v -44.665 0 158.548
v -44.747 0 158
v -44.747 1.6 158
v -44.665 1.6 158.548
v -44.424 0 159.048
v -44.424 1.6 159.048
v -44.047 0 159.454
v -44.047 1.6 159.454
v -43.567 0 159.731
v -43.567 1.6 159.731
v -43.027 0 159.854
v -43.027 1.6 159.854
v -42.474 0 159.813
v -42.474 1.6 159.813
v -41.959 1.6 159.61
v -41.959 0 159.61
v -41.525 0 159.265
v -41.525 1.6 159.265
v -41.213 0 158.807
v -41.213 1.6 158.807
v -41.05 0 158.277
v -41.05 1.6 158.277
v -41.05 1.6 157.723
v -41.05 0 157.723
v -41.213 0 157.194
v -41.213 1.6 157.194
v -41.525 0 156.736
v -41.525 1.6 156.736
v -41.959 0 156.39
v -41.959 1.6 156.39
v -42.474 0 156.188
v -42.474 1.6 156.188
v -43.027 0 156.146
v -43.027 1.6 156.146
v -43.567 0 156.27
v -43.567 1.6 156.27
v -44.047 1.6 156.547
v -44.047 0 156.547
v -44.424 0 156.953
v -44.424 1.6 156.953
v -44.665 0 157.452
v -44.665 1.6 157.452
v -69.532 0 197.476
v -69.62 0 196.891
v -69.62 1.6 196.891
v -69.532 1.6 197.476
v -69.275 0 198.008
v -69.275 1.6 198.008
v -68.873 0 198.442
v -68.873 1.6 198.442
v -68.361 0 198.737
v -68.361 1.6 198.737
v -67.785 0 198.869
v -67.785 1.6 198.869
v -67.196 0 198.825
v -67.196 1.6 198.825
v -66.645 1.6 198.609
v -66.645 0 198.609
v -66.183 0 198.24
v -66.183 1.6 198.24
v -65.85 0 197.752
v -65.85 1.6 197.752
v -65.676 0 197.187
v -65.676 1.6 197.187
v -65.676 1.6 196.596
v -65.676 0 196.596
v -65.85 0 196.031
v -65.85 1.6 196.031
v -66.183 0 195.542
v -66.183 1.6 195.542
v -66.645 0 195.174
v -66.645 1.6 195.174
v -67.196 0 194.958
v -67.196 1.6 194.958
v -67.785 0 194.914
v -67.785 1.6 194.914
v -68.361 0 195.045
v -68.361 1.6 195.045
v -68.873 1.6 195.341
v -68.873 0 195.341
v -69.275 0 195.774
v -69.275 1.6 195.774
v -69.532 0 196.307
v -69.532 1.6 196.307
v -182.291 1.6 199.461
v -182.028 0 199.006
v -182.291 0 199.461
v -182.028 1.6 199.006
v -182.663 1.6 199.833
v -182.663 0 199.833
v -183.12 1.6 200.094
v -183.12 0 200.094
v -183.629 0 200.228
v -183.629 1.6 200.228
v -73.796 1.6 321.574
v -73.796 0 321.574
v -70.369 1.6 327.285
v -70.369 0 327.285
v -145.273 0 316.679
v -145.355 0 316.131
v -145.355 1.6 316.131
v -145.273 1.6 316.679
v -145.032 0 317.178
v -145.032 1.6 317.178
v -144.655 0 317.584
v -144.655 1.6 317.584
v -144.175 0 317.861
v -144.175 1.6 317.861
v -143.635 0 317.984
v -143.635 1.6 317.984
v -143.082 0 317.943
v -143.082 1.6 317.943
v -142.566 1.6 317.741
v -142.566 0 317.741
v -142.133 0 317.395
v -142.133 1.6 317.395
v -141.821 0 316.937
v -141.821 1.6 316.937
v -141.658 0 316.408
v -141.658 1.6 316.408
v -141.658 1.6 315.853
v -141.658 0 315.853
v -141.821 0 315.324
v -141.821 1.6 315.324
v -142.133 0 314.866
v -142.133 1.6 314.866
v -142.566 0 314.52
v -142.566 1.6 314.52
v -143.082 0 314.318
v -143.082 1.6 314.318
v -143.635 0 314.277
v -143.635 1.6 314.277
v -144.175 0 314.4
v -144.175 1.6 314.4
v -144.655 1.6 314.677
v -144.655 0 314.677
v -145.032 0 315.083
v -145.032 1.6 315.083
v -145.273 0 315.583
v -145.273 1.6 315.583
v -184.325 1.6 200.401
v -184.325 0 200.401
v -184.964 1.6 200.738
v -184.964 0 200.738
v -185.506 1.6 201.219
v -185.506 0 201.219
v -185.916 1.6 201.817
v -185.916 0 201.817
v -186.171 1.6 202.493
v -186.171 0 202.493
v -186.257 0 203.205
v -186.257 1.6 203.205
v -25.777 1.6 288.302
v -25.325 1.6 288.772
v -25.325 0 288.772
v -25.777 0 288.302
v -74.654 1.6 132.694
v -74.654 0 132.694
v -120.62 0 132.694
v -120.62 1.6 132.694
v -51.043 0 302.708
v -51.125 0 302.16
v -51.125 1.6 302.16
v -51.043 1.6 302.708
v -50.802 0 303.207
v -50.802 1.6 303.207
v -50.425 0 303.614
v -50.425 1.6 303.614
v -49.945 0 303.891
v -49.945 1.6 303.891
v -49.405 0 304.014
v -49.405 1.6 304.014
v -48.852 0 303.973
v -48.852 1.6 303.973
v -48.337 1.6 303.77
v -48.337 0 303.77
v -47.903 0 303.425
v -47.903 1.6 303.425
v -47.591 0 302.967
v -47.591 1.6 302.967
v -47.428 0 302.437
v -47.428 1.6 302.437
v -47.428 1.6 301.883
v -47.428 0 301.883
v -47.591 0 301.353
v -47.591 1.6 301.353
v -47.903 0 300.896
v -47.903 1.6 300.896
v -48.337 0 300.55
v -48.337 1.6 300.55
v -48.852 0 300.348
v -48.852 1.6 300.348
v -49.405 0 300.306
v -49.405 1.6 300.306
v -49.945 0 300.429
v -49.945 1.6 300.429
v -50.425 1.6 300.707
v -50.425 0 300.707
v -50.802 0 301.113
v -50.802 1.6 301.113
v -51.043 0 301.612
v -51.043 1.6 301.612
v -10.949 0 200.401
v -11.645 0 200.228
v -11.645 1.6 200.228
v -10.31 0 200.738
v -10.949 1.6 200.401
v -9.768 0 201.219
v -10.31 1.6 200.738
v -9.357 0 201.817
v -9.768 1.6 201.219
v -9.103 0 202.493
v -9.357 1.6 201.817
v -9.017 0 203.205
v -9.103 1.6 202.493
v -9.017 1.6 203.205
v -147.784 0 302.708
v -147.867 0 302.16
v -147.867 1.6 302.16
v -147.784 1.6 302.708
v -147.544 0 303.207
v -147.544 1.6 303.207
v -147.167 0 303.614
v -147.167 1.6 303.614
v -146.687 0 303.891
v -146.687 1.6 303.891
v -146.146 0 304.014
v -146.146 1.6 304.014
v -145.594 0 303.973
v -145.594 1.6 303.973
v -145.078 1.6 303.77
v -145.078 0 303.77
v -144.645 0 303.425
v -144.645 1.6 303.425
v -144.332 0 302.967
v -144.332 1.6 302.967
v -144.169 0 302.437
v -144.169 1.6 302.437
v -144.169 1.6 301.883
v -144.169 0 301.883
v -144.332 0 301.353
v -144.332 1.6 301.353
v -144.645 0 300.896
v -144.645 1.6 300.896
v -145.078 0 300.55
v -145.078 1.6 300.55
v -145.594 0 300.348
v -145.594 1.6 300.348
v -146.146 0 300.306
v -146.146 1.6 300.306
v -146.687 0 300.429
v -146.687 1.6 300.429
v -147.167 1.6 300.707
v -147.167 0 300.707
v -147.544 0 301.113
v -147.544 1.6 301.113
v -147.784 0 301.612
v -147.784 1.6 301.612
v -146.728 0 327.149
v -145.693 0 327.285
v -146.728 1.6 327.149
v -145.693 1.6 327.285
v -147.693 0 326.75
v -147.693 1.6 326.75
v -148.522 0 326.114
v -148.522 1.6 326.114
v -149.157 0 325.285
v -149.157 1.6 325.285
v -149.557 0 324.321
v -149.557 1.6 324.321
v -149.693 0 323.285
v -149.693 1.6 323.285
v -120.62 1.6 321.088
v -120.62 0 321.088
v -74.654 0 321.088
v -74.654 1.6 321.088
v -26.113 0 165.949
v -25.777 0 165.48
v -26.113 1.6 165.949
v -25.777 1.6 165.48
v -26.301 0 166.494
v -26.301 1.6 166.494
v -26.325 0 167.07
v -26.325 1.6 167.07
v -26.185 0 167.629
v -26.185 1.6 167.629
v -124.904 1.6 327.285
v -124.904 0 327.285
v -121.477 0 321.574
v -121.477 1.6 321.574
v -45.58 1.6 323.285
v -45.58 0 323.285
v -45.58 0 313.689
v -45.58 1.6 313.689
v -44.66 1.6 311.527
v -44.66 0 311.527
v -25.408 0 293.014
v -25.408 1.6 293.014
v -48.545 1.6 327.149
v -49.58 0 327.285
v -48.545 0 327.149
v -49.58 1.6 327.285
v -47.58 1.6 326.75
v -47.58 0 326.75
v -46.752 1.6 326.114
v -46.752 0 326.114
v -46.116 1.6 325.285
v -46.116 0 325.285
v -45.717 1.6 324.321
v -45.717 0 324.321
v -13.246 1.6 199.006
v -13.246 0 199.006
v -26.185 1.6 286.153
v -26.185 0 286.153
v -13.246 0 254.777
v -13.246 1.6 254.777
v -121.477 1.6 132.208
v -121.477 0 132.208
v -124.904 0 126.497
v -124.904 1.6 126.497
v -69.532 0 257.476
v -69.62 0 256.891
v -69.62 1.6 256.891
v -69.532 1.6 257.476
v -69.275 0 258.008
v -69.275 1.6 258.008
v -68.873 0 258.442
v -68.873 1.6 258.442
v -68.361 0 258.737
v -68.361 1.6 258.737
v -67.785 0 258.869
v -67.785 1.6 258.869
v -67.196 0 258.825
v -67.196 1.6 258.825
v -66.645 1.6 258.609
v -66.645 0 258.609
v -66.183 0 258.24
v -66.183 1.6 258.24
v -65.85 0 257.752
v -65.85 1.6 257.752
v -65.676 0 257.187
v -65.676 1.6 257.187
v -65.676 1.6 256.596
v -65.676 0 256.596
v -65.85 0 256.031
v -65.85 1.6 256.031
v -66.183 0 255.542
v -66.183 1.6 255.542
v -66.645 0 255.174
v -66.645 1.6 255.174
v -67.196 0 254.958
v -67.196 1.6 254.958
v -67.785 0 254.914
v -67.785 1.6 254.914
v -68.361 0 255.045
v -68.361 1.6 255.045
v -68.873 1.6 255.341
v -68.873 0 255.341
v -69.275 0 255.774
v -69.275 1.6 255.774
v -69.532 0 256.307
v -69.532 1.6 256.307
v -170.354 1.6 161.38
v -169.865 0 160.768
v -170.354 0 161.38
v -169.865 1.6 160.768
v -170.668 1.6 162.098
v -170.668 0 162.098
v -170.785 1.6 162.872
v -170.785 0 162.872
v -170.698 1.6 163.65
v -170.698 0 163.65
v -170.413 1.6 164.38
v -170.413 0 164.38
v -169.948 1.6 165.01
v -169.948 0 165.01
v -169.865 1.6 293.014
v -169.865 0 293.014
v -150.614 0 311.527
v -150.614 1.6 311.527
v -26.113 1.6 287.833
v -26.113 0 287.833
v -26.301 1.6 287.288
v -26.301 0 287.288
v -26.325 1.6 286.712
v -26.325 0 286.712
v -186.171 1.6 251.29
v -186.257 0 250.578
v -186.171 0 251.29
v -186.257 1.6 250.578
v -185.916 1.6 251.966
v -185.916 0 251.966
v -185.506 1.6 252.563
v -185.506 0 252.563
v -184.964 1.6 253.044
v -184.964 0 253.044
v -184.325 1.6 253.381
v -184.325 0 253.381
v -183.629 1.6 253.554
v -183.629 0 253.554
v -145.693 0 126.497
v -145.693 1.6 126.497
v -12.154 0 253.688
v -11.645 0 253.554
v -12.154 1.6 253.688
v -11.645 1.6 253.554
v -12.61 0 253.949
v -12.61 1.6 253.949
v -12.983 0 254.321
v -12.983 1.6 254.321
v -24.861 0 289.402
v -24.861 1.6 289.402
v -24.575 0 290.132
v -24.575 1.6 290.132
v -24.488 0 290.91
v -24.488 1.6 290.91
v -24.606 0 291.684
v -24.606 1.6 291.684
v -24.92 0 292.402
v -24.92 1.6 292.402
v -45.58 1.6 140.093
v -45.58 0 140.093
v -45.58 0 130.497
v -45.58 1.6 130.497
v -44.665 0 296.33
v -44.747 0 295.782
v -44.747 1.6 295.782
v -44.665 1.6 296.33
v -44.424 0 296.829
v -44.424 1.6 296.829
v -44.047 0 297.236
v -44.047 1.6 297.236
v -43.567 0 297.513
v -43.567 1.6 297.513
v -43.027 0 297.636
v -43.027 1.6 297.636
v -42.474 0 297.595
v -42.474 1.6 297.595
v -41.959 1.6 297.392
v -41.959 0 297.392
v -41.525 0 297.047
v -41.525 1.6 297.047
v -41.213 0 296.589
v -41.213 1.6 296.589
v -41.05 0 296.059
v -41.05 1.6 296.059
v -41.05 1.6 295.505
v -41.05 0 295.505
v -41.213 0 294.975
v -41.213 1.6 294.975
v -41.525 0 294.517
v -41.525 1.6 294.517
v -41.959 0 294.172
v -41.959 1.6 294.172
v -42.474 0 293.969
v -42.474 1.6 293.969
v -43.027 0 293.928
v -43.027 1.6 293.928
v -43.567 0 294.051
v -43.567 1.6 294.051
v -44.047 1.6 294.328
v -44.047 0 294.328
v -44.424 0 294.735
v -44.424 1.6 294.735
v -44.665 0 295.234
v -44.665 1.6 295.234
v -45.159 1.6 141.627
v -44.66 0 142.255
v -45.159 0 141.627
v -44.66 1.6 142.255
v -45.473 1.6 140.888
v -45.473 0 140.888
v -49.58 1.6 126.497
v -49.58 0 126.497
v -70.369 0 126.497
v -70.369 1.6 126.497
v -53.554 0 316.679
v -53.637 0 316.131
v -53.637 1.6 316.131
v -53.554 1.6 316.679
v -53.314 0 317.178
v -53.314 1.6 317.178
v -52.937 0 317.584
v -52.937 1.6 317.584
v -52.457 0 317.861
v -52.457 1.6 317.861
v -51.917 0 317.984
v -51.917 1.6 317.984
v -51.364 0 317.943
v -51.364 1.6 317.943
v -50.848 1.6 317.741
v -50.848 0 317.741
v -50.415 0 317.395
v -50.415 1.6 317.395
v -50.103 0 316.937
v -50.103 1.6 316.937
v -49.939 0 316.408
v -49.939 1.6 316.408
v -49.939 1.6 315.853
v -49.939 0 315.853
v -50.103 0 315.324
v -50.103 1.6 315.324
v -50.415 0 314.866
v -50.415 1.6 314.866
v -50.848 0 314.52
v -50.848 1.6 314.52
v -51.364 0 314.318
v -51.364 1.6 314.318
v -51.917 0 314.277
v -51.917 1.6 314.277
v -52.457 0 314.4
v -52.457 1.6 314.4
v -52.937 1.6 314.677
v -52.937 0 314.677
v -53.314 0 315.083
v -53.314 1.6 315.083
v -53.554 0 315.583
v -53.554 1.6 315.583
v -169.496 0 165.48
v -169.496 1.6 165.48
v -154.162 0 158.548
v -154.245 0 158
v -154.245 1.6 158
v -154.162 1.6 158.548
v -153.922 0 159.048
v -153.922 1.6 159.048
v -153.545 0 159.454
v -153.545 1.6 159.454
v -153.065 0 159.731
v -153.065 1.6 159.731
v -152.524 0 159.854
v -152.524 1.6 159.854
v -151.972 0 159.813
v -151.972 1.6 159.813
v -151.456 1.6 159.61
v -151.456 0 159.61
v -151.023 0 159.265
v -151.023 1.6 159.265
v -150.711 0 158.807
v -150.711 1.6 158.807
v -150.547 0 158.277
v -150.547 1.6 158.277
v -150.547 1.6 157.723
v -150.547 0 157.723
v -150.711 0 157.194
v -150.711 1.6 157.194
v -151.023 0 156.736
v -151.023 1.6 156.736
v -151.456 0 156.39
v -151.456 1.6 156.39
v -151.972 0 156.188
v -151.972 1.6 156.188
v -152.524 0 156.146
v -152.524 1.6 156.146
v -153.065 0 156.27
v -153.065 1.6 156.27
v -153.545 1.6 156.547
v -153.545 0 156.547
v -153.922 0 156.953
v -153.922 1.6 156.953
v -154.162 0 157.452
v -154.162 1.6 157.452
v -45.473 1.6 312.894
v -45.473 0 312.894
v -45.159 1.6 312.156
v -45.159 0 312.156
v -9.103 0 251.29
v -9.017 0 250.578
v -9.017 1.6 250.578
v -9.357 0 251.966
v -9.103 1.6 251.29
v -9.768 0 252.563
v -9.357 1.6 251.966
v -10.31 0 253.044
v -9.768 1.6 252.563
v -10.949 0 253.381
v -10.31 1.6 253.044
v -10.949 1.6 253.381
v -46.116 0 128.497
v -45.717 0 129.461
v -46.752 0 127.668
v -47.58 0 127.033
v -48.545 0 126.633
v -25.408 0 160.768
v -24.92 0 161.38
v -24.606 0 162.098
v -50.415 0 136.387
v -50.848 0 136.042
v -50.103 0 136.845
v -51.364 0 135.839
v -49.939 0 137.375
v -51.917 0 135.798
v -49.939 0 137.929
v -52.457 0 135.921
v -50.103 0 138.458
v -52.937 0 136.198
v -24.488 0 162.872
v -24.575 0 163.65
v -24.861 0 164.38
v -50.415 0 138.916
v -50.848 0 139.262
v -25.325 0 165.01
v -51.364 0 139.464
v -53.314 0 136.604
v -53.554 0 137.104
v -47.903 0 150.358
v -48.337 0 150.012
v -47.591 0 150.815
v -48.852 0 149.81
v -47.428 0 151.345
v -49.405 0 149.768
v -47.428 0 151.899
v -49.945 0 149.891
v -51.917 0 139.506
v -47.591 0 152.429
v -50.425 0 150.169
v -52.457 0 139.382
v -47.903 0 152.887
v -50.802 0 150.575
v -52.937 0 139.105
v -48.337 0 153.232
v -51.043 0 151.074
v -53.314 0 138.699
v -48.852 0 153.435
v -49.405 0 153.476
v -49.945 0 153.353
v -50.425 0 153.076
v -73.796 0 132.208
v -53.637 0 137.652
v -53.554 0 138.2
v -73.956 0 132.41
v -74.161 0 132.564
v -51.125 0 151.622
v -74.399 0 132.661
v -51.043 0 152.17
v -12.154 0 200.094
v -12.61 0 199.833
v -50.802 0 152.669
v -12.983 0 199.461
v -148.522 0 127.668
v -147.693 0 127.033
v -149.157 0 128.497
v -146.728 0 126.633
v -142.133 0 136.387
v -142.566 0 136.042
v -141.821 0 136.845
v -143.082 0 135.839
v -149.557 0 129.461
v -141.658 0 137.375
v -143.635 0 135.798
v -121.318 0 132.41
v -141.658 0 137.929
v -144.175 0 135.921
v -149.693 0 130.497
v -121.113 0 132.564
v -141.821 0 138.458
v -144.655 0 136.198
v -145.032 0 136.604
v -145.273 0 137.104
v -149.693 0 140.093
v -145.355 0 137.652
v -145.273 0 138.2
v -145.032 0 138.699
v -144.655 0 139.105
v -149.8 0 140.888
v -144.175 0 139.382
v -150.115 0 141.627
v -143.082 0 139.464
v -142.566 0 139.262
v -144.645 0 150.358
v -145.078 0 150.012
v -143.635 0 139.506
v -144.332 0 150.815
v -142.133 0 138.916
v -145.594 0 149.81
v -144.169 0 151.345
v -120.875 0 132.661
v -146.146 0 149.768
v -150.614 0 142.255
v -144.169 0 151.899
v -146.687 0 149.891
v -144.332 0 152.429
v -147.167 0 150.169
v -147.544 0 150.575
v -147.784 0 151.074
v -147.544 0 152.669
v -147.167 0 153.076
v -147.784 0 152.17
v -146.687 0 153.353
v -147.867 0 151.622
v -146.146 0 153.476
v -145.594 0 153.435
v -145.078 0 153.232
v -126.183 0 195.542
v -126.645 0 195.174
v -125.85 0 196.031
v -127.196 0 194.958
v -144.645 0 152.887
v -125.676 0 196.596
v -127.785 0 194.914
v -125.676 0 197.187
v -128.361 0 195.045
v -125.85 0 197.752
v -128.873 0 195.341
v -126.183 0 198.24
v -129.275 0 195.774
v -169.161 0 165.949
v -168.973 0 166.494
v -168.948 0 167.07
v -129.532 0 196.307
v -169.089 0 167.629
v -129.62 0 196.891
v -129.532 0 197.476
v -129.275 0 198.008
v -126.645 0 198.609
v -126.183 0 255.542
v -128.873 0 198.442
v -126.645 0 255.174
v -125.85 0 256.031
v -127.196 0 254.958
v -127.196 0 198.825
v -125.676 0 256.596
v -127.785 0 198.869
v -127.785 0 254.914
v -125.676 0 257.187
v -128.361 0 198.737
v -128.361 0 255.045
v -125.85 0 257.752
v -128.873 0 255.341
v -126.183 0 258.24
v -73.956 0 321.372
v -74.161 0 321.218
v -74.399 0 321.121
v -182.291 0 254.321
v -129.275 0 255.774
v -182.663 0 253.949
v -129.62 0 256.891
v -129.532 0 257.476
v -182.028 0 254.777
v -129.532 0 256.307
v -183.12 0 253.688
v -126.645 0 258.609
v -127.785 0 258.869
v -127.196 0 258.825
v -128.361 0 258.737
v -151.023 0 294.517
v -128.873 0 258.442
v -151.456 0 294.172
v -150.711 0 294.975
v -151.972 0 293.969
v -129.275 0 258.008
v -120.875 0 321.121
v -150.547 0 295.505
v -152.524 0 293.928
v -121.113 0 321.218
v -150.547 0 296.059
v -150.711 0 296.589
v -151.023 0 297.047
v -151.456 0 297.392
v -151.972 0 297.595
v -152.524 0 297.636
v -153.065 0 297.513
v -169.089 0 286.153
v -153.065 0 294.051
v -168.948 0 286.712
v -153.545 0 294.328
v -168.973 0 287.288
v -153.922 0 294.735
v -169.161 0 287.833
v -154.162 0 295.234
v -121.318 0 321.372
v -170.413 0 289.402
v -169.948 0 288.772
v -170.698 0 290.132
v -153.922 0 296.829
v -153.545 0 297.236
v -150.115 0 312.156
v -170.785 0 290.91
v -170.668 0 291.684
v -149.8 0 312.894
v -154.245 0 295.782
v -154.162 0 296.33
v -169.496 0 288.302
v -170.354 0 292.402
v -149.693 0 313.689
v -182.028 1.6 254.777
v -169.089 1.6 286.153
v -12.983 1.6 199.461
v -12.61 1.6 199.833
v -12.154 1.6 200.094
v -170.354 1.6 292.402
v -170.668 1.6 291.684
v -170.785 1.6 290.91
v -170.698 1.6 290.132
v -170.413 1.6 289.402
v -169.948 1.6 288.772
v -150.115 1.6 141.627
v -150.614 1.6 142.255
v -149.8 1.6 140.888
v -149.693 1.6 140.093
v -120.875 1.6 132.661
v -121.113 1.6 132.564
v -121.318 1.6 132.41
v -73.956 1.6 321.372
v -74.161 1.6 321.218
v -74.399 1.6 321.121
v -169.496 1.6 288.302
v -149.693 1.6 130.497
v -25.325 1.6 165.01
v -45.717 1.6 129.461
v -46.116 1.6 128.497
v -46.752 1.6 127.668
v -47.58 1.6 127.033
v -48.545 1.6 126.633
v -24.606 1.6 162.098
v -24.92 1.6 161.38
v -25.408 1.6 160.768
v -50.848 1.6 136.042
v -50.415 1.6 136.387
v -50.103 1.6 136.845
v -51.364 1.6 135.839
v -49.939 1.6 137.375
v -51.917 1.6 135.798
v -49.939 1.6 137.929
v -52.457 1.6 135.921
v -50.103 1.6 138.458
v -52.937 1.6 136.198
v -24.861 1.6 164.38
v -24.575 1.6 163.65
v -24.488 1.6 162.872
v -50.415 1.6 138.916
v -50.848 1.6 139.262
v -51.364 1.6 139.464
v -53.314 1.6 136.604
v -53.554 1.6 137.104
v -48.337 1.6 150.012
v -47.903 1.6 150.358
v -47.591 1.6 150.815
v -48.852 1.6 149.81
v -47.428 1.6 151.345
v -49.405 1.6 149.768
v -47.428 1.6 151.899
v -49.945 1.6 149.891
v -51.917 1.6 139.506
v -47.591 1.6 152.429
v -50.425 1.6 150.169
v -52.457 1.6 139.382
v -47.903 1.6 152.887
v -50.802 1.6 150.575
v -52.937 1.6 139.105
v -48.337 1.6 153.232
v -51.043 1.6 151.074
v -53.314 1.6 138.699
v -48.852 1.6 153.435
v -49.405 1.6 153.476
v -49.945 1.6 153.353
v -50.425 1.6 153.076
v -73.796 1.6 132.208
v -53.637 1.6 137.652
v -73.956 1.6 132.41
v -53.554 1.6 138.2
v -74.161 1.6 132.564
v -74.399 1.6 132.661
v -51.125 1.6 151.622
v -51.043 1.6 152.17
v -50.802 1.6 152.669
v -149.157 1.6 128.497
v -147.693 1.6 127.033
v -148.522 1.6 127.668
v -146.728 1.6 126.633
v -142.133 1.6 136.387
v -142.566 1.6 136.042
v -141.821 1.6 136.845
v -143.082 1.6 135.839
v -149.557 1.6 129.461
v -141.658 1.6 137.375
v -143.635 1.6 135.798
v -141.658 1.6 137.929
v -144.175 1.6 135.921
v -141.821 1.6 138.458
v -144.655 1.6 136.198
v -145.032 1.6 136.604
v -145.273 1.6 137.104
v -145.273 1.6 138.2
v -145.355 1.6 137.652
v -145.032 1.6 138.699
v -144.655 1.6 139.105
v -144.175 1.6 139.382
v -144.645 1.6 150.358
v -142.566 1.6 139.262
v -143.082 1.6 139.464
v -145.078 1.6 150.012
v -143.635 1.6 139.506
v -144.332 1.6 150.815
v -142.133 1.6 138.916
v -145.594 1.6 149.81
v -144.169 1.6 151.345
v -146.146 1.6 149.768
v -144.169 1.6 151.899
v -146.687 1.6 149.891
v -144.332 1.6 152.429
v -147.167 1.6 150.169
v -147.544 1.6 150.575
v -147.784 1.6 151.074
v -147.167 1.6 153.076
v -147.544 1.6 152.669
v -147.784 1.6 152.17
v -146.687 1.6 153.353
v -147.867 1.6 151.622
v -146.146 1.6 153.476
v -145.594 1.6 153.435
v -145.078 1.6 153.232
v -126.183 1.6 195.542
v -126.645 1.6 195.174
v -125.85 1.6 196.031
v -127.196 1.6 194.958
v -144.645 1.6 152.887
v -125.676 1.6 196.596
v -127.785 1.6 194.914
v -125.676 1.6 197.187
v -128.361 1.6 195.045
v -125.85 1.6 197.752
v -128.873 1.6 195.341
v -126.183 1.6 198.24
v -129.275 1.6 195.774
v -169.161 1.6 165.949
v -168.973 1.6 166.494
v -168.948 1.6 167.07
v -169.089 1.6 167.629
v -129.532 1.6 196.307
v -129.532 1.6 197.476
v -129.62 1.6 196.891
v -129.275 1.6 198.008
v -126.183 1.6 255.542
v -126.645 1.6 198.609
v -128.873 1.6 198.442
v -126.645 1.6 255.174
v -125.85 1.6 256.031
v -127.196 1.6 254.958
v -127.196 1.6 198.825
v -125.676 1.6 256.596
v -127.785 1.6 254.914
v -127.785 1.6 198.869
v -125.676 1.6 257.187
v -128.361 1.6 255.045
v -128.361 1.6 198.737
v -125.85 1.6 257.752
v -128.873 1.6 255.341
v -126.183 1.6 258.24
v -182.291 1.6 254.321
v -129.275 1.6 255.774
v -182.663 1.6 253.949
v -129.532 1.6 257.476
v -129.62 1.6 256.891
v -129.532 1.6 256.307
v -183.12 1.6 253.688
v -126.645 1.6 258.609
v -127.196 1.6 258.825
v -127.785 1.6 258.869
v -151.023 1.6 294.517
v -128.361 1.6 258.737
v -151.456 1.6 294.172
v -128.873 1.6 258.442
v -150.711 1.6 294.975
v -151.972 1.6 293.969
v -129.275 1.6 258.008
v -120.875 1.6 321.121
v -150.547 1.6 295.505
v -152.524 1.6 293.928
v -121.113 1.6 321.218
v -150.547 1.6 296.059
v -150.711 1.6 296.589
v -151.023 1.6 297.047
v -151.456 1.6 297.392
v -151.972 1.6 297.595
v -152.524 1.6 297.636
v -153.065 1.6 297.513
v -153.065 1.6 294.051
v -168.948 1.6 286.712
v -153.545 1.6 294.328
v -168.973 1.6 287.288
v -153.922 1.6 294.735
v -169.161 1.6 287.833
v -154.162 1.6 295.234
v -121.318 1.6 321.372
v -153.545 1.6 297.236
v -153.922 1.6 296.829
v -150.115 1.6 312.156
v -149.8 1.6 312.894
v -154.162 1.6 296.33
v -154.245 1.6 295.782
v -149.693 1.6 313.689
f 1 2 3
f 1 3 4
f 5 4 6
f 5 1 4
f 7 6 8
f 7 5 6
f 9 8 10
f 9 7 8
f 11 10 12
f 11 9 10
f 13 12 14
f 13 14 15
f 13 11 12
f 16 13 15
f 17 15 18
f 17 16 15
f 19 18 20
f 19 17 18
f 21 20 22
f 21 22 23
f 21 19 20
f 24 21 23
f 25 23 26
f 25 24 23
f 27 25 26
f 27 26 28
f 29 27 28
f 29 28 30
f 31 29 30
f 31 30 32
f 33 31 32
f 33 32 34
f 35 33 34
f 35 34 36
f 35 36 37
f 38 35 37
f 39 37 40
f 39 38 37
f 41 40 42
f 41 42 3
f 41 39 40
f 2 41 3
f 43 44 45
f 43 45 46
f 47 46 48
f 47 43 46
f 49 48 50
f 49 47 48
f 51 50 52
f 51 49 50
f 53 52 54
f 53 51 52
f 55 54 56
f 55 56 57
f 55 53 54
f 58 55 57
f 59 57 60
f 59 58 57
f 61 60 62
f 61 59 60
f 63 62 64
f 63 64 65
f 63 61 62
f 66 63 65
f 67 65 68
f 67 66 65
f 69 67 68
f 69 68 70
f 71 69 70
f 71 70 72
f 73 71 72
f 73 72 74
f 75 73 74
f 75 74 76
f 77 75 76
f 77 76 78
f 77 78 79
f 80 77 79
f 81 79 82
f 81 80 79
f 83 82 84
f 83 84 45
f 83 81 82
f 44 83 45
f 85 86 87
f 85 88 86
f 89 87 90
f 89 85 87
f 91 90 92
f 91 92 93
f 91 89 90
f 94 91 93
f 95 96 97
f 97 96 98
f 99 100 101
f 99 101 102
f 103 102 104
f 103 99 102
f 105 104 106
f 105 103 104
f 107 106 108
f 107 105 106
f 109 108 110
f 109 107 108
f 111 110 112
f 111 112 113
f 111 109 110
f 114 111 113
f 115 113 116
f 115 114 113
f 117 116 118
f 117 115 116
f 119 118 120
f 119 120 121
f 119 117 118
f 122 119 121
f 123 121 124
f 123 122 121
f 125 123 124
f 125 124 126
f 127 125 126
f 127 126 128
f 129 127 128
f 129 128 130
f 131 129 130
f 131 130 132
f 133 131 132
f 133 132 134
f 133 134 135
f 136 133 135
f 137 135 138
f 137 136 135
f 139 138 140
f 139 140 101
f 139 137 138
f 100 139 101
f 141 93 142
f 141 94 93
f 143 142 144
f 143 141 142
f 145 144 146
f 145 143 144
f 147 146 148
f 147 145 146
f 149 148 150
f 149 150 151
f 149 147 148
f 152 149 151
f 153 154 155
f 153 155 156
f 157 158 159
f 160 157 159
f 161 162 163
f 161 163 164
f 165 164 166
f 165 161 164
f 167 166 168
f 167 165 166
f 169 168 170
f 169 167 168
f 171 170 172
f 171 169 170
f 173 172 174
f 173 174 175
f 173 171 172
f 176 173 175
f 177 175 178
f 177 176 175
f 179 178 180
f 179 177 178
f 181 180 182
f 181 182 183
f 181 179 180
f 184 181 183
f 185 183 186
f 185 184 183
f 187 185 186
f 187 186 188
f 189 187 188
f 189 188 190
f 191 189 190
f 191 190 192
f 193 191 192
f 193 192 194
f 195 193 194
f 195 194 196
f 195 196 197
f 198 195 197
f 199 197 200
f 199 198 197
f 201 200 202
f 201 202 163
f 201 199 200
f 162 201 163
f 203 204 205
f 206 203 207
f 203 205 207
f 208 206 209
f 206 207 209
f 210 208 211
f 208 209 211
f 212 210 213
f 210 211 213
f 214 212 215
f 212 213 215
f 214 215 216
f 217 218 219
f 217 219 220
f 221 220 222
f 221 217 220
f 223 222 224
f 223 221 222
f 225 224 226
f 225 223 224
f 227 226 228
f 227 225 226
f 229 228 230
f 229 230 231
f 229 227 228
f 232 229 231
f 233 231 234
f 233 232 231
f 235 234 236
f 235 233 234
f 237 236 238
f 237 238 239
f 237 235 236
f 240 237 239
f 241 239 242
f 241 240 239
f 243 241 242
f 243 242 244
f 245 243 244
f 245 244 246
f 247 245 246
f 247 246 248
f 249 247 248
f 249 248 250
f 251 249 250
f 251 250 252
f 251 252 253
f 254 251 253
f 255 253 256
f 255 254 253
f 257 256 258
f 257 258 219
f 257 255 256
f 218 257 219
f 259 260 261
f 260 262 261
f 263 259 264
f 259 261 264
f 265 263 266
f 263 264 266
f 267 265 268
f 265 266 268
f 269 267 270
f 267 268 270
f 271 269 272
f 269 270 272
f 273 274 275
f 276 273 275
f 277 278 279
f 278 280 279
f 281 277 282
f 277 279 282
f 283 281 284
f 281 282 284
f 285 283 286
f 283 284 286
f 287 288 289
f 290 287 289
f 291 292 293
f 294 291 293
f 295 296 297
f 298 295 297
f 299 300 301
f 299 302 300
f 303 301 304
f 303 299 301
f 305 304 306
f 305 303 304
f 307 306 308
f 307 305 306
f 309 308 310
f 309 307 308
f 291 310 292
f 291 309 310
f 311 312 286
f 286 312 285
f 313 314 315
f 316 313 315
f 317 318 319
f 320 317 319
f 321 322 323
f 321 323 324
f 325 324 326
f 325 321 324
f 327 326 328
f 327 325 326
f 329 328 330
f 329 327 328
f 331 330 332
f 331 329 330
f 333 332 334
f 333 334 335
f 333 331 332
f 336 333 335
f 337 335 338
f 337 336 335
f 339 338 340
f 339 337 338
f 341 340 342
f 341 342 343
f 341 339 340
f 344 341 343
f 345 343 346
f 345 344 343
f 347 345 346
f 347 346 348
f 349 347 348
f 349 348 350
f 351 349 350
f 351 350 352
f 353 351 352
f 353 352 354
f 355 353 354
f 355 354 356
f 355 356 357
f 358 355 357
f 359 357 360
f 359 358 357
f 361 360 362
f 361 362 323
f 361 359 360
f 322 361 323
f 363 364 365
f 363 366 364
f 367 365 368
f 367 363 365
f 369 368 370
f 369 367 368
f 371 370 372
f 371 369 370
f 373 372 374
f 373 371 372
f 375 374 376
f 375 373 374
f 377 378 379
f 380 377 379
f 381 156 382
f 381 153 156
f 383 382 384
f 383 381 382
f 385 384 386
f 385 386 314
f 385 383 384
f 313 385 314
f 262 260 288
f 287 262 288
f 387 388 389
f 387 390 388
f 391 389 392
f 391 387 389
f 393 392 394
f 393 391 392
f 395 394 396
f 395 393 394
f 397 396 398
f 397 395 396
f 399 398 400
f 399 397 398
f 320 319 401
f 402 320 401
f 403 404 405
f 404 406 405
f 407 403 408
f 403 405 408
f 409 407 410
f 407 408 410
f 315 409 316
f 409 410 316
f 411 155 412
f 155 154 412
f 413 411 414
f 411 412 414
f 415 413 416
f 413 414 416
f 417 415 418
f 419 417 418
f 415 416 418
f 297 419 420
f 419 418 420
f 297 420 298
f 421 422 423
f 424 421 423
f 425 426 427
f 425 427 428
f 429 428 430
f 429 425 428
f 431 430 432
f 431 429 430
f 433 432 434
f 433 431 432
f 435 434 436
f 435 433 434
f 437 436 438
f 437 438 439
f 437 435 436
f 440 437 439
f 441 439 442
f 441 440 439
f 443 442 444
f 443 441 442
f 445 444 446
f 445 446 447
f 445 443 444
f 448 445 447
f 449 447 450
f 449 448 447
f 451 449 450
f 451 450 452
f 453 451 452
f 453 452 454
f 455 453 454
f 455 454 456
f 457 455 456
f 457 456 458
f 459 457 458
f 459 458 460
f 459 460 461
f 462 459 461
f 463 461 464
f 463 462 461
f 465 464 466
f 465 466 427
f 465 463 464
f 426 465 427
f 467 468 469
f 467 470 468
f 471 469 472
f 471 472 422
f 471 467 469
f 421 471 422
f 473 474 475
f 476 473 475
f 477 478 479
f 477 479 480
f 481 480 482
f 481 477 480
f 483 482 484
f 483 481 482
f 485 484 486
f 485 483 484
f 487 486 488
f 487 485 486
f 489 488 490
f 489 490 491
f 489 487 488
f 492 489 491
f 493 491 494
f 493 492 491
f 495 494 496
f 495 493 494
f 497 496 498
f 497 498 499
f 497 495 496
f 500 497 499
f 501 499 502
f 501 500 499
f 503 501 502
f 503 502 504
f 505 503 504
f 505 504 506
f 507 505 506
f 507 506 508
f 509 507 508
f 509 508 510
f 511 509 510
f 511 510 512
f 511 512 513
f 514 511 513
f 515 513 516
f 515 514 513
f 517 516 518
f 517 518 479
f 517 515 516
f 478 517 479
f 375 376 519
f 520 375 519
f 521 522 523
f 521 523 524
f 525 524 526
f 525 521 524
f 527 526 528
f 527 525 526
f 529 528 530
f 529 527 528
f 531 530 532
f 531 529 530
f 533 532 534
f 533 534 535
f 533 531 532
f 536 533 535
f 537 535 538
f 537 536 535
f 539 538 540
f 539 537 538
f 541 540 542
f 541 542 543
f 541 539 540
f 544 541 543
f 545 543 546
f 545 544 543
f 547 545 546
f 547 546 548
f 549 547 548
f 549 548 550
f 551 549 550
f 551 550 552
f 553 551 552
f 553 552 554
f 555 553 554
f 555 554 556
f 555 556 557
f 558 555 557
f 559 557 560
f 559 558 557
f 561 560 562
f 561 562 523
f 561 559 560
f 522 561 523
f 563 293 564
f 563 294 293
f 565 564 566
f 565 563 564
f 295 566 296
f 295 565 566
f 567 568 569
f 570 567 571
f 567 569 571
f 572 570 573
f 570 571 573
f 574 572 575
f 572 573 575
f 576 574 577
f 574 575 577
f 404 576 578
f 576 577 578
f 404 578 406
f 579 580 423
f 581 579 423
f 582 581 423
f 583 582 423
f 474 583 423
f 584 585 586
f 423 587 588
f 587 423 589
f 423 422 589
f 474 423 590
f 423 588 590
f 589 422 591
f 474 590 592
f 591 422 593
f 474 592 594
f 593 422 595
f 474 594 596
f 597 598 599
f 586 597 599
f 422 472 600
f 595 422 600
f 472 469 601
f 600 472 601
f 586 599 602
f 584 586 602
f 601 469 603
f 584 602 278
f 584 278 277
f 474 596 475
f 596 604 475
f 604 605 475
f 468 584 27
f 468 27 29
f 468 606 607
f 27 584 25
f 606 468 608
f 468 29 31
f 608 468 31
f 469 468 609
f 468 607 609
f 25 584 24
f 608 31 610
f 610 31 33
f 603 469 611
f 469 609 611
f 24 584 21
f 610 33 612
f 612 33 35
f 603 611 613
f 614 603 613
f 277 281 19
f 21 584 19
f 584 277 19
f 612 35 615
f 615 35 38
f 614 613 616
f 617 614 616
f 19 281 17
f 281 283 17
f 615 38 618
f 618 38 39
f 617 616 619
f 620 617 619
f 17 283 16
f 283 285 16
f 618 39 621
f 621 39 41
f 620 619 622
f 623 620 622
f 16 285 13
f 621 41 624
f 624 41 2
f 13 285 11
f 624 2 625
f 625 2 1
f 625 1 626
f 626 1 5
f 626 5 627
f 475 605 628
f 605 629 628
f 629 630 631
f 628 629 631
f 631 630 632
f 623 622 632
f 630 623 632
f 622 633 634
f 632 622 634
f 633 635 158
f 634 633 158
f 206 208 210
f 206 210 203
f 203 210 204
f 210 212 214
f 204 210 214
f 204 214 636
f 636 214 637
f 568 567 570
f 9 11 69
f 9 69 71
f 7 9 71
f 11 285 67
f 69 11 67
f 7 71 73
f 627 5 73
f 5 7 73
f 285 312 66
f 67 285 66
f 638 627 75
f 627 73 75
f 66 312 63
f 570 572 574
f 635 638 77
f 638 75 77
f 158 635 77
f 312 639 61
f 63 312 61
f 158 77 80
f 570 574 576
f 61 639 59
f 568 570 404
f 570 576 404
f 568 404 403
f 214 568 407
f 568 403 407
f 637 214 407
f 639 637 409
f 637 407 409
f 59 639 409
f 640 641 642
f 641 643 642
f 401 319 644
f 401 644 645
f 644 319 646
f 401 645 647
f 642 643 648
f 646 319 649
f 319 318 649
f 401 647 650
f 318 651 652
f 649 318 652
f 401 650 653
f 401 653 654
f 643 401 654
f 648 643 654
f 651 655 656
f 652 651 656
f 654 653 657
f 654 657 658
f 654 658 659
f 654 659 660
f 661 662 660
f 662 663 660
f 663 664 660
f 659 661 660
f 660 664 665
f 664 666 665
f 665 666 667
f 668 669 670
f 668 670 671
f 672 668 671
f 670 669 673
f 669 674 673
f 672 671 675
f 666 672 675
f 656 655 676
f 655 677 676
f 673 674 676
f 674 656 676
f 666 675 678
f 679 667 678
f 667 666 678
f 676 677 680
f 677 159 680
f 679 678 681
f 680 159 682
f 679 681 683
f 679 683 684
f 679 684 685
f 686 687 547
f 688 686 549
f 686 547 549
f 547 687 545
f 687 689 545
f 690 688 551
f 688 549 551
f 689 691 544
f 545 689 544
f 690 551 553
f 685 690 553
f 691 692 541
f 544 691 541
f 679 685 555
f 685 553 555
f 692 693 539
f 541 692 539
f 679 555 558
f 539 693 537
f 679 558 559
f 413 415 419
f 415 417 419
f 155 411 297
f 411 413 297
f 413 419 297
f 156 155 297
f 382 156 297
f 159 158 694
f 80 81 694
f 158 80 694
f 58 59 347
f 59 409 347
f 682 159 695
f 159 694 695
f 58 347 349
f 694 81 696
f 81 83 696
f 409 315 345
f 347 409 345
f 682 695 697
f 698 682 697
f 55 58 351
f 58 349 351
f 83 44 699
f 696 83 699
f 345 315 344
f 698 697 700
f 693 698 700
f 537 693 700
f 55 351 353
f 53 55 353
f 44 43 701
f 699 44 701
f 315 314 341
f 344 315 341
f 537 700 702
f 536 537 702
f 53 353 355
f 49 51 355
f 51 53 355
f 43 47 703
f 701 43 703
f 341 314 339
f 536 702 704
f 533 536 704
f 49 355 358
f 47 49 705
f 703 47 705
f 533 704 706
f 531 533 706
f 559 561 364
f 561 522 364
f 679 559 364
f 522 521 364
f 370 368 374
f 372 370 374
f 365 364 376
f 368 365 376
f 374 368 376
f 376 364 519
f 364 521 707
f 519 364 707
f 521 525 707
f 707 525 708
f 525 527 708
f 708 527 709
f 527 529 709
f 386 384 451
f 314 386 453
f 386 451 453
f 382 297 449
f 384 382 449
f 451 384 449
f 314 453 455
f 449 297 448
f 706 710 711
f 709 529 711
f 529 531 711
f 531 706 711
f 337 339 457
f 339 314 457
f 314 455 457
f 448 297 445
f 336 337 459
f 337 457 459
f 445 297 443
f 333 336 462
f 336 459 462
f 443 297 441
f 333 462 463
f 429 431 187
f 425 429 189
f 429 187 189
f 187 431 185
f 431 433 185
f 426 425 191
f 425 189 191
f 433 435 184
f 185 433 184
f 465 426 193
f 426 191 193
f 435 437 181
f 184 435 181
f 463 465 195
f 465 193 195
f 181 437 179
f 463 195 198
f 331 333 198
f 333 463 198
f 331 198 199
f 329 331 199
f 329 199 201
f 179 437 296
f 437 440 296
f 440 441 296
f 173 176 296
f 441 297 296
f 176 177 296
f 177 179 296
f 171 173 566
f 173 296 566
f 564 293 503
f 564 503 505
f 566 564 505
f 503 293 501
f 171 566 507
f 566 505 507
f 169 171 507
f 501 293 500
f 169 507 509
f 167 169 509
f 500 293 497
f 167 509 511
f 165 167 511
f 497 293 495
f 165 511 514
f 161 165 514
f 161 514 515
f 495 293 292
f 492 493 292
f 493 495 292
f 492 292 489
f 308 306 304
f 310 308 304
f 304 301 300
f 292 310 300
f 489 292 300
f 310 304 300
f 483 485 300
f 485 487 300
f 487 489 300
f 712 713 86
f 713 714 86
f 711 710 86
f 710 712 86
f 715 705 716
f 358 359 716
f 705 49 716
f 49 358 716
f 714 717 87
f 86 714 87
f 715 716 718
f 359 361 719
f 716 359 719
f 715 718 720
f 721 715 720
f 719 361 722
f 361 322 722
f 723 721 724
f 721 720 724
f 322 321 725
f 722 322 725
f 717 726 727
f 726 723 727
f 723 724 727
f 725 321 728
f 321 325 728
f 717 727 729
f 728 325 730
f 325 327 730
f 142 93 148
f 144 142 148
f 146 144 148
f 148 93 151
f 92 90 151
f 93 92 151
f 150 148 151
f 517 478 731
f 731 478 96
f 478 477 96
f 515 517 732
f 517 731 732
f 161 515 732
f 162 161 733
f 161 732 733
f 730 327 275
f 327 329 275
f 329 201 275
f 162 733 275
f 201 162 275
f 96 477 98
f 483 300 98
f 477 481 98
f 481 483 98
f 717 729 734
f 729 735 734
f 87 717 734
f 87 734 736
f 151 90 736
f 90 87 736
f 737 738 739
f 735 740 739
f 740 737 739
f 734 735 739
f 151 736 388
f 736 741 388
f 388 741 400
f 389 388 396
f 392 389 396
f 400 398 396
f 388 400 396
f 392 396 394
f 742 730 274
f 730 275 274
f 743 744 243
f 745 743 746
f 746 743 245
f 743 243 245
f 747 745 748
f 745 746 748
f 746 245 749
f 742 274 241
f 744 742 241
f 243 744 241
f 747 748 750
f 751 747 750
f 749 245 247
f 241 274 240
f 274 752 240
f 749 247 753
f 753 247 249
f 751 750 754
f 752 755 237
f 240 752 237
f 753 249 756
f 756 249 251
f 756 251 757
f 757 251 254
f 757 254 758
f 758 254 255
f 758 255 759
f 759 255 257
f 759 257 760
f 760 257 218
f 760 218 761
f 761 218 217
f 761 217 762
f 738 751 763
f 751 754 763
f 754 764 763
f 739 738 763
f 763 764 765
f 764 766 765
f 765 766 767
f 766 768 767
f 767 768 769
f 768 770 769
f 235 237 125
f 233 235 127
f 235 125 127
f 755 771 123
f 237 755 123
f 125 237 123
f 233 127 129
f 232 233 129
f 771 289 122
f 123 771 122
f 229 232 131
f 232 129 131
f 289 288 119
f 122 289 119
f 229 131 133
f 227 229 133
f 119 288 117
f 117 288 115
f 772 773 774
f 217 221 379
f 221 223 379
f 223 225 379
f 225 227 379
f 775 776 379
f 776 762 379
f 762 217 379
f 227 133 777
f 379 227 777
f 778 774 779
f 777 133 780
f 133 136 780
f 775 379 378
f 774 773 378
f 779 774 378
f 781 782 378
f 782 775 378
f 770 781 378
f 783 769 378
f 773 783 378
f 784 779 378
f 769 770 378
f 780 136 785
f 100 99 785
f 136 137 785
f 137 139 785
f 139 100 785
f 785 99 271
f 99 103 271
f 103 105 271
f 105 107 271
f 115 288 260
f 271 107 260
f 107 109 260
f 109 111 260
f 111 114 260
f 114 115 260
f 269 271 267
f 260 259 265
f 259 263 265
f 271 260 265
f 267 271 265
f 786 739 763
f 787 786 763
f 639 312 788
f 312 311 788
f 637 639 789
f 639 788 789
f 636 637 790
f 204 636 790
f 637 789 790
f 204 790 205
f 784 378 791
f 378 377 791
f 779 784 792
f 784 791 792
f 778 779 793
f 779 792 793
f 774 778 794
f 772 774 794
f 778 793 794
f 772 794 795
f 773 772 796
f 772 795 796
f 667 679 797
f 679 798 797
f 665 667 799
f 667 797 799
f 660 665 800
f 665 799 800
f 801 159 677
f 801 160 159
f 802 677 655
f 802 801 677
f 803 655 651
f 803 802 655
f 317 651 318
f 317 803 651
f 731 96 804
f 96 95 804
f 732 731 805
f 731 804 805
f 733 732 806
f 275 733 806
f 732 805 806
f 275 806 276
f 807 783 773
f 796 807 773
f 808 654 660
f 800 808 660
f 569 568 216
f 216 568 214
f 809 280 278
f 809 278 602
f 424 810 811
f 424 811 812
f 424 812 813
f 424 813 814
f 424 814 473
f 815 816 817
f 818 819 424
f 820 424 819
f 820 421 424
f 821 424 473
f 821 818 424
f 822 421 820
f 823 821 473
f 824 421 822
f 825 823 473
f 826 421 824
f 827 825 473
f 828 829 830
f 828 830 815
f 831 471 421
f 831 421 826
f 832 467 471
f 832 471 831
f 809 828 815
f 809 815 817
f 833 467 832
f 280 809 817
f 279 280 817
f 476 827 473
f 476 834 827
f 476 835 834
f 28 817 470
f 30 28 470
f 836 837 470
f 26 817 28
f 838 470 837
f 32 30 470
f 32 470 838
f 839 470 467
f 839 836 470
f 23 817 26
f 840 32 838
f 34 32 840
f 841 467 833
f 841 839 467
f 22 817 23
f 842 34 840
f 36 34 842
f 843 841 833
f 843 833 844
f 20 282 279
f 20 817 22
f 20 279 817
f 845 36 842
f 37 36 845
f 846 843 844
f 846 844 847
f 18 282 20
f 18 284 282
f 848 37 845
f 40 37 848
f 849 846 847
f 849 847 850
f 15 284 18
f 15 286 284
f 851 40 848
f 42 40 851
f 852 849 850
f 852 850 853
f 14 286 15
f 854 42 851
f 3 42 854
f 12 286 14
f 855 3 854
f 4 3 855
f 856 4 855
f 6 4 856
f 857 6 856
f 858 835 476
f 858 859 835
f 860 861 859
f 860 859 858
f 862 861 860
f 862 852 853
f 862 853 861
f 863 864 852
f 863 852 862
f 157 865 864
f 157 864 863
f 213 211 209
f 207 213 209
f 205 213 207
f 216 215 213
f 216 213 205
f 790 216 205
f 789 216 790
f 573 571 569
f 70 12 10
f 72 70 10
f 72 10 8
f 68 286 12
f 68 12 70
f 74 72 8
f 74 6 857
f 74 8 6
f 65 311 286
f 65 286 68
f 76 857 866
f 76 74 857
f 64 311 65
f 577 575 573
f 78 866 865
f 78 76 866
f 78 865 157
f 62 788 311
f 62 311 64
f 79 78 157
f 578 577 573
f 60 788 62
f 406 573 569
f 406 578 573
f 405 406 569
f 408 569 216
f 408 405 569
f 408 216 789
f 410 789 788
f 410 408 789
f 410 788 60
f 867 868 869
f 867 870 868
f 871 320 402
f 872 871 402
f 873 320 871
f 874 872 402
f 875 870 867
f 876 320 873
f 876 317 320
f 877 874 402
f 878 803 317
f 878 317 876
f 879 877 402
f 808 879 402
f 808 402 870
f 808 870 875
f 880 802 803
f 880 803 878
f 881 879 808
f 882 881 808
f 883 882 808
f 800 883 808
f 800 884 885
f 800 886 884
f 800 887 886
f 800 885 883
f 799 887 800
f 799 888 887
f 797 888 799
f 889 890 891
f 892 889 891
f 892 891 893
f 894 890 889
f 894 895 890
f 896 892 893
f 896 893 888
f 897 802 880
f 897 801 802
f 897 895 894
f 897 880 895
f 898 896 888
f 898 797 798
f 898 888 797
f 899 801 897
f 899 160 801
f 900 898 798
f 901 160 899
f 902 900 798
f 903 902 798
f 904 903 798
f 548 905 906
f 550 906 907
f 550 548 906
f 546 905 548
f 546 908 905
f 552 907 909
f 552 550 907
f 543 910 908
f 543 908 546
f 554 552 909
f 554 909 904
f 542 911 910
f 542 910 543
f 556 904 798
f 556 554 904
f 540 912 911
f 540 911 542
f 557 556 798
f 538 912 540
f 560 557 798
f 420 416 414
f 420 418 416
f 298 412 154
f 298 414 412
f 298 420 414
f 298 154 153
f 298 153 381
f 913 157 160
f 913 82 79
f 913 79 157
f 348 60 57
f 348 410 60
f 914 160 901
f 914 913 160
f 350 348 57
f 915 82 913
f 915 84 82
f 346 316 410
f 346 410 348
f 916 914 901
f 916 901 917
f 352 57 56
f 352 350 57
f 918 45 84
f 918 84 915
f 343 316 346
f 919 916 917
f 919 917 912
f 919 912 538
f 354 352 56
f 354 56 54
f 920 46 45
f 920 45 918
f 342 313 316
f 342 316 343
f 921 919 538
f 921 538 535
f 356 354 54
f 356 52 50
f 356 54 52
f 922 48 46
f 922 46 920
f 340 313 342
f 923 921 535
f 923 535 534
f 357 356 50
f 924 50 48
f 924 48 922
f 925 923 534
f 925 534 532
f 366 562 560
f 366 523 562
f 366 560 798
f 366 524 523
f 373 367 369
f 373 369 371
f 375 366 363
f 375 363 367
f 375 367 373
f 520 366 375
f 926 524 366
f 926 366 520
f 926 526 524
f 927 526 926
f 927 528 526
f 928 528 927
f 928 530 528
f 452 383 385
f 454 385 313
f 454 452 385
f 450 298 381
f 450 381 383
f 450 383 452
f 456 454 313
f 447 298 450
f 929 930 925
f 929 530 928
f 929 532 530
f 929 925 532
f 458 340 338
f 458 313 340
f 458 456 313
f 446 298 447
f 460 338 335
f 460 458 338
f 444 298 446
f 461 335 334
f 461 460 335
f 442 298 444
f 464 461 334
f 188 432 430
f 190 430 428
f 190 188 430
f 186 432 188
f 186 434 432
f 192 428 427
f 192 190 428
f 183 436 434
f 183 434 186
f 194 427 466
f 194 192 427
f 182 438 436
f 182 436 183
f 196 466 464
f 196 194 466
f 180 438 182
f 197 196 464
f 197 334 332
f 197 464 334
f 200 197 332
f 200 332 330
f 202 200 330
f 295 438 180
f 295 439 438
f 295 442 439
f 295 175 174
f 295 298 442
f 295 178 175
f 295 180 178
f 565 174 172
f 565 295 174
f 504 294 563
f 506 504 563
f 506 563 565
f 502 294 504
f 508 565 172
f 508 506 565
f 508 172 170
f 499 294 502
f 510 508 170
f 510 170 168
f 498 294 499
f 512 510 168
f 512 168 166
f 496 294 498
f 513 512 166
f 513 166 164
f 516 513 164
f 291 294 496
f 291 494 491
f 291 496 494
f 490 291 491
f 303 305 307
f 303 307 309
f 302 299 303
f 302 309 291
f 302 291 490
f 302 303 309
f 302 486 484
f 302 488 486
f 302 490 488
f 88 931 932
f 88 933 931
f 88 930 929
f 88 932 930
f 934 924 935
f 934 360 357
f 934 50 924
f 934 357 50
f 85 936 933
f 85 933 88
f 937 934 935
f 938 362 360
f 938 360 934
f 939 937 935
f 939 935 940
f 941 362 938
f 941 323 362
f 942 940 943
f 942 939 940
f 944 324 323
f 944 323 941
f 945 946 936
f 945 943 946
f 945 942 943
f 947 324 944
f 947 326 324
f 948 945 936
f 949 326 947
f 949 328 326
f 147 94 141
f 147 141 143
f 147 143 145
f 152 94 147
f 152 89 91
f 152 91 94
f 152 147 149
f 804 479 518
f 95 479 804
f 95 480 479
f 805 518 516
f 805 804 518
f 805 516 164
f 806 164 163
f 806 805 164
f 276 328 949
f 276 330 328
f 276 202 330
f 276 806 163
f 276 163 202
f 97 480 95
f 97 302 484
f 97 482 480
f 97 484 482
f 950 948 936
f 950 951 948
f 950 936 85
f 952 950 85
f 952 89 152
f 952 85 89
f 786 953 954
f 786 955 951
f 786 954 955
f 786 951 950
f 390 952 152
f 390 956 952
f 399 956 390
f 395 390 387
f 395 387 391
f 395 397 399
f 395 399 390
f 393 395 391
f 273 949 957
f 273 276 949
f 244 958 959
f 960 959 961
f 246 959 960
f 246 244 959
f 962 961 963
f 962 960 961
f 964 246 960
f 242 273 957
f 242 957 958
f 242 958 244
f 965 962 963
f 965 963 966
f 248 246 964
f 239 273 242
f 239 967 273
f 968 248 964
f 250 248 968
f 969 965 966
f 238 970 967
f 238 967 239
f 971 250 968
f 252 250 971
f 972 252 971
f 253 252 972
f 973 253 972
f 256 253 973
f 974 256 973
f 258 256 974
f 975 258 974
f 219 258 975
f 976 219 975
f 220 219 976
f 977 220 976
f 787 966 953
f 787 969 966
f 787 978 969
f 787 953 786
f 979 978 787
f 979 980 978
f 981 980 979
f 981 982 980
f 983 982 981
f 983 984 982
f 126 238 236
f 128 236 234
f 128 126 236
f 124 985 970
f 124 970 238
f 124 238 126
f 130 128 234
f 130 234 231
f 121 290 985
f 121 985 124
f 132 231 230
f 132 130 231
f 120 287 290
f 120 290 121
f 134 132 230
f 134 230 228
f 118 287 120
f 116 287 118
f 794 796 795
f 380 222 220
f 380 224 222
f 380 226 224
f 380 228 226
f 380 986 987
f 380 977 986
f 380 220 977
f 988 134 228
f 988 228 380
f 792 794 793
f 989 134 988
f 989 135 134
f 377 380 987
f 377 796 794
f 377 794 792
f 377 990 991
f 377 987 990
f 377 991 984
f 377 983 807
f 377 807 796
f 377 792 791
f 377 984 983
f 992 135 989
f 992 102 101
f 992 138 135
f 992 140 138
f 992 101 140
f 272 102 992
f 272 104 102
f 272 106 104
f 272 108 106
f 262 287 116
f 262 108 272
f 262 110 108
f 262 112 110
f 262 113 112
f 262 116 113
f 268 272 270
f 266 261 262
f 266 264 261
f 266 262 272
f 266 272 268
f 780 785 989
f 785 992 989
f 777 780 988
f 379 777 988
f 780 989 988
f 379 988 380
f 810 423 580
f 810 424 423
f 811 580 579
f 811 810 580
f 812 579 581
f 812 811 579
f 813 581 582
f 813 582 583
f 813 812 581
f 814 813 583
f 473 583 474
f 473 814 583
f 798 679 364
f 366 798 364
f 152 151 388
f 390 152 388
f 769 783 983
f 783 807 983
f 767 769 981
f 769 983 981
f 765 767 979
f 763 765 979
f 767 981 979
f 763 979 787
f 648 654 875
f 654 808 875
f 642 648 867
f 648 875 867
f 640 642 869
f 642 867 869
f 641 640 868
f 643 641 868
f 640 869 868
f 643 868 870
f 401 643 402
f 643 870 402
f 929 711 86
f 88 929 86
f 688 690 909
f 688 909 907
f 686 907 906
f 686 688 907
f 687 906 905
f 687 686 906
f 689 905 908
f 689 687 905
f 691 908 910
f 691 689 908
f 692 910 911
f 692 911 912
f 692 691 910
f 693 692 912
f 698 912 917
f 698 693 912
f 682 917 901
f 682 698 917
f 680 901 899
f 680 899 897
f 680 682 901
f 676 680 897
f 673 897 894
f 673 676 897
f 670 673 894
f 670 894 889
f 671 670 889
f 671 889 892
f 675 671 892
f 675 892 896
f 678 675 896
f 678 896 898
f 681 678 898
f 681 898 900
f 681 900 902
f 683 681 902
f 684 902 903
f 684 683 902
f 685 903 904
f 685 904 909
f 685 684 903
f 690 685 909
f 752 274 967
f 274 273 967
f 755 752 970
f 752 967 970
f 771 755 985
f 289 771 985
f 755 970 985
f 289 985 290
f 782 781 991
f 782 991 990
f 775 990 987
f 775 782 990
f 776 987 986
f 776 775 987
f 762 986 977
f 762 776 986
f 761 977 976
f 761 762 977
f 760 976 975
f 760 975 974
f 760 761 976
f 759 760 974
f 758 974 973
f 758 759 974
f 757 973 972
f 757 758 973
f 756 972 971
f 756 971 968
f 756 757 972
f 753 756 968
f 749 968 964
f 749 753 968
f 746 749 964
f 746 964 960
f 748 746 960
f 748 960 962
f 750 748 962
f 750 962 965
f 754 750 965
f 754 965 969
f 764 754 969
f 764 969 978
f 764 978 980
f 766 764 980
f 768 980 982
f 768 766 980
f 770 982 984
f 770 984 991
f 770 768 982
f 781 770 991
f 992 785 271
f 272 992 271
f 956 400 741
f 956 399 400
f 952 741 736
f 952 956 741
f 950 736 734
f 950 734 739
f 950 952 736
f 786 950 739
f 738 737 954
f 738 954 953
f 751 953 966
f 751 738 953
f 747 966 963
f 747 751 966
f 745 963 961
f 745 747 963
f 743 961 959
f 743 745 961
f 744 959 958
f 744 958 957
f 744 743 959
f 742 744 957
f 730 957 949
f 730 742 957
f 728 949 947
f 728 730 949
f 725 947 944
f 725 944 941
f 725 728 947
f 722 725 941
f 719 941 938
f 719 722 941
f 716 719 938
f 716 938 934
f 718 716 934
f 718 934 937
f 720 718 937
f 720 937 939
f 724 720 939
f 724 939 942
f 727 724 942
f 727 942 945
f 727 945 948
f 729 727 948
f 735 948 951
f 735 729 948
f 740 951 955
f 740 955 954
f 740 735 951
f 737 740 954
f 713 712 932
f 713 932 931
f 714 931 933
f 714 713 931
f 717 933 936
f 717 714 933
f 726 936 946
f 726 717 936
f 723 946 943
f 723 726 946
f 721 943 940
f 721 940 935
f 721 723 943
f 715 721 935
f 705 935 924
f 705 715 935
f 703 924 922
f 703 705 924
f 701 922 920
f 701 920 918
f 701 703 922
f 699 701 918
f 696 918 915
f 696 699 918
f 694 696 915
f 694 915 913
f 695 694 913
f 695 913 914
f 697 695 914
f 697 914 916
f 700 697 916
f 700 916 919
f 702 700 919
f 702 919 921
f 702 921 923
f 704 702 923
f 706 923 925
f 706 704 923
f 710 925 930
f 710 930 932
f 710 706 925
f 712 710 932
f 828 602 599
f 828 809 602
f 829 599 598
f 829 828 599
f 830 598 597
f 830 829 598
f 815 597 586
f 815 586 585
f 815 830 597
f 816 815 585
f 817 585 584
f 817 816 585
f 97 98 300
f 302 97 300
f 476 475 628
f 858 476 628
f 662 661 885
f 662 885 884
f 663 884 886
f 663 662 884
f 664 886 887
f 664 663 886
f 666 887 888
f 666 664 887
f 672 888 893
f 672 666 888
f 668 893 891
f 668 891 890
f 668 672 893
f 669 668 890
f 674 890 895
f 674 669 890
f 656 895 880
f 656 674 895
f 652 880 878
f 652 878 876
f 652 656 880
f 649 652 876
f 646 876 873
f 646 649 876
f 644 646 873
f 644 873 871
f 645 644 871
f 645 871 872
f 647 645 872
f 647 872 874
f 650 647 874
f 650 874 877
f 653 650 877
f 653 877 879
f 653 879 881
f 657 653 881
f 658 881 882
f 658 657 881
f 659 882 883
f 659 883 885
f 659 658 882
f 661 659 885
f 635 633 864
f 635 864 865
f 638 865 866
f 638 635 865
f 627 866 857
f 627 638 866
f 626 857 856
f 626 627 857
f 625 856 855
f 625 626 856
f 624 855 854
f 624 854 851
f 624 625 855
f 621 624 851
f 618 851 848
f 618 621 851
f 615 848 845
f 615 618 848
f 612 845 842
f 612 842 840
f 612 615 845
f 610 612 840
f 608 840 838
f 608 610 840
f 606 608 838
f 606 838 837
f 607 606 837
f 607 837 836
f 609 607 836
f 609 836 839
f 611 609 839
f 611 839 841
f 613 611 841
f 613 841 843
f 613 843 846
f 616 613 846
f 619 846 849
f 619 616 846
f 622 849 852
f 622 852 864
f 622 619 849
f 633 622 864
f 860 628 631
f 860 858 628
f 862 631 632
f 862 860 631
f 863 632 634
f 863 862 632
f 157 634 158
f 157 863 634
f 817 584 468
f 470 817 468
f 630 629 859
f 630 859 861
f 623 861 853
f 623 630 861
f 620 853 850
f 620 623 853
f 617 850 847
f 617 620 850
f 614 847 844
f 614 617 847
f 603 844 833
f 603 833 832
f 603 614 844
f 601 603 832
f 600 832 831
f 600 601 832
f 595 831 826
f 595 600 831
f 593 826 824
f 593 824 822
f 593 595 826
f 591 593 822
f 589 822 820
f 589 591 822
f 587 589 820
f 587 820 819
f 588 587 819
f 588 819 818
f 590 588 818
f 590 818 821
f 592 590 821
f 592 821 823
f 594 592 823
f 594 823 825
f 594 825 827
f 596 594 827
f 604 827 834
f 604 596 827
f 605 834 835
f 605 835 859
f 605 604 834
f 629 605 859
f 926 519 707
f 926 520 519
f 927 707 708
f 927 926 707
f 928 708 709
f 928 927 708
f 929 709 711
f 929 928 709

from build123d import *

# Parameters (mm, degrees)
SKETCH1_R        = 1.85915493
SKETCH1_R_2      = 1.983111479
EXTRUSION1_DEPTH = 1.6
FILLET1_R        = 1
FILLET2_R        = 4
FILLET3_R        = 3
FILLET4_R        = 3
FILLET5_R        = 2
FILLET6_R        = 2
FILLET7_R        = 3
FILLET8_R        = 3
FILLET9_R        = 2
FILLET10_R       = 2
FILLET11_R       = 3


with BuildPart() as part:
    # Sketch1 → Extrusion1 (new body)
    with BuildSketch(Plane(origin=(0, 0, 0), x_dir=(-1, 0, 0), z_dir=(0, 1, 0))):
        Polygon((74.087520418, 321.088295015), (70.369210559, 327.285477572), (45.580478165, 327.285477572), (45.580478165, 312.412238135), (23.246043749, 290.934342561), (26.682507041, 287.360833055), (12.735407819, 253.538985229), (9.017097883, 253.538985229), (9.017097883, 226.891111382), (9.017097883, 200.243237534), (12.735407819, 200.243237534), (26.682507041, 166.421389708), (23.246043749, 162.847880202), (45.580478165, 141.369984628), (45.580478165, 126.496745191), (70.369210559, 126.496745191), (74.087520418, 132.693927748), (97.636816193, 132.693927748), (121.186111968, 132.693927748), (124.904421827, 126.496745191), (149.693154221, 126.496745191), (149.693154221, 141.369984628), (172.027588636, 162.847880202), (168.591125345, 166.421389708), (182.538224567, 200.243237534), (186.256534503, 200.243237534), (186.256534503, 226.891111382), (186.256534503, 253.538985229), (182.538224567, 253.538985229), (168.591125345, 287.360833055), (172.027588636, 290.934342561), (149.693154221, 312.412238135), (149.693154221, 327.285477572), (124.904421827, 327.285477572), (121.186111968, 321.088295015), (97.636816193, 321.088295015), align=None)
        with Locations((49.266182018, 151.62213525)):
            Circle(SKETCH1_R, mode=Mode.SUBTRACT)
        with Locations((51.777661187, 316.130534525)):
            Circle(SKETCH1_R, mode=Mode.SUBTRACT)
        with Locations((49.266182018, 302.160087513)):
            Circle(SKETCH1_R, mode=Mode.SUBTRACT)
        with Locations((143.495971199, 137.651688238)):
            Circle(SKETCH1_R, mode=Mode.SUBTRACT)
        with Locations((146.007450368, 151.62213525)):
            Circle(SKETCH1_R, mode=Mode.SUBTRACT)
        with Locations((143.495971199, 316.130534525)):
            Circle(SKETCH1_R, mode=Mode.SUBTRACT)
        with Locations((146.007450368, 302.160087513)):
            Circle(SKETCH1_R, mode=Mode.SUBTRACT)
        with Locations((51.777661187, 137.651688238)):
            Circle(SKETCH1_R, mode=Mode.SUBTRACT)
        with Locations((67.636816193, 196.891111382)):
            Circle(SKETCH1_R_2, mode=Mode.SUBTRACT)
        with Locations((67.636816193, 256.891111382)):
            Circle(SKETCH1_R_2, mode=Mode.SUBTRACT)
        with Locations((42.888078851, 158.000238416)):
            Circle(SKETCH1_R, mode=Mode.SUBTRACT)
        with Locations((152.385553534, 295.781984347)):
            Circle(SKETCH1_R, mode=Mode.SUBTRACT)
        with Locations((42.888078851, 295.781984347)):
            Circle(SKETCH1_R, mode=Mode.SUBTRACT)
        with Locations((127.636816193, 256.891111382)):
            Circle(SKETCH1_R_2, mode=Mode.SUBTRACT)
        with Locations((152.385553534, 158.000238416)):
            Circle(SKETCH1_R, mode=Mode.SUBTRACT)
        with Locations((127.636816193, 196.891111382)):
            Circle(SKETCH1_R_2, mode=Mode.SUBTRACT)
    extrude(amount=EXTRUSION1_DEPTH)

    # Fillet1
    fillet1_edges = [part.edges().sort_by_distance(p)[0] for p in [
        (-121.186111968, 0.8, 321.088295015),
        (-121.186111968, 0.8, 132.693927748),
        (-74.087520418, 0.8, 132.693927748),
        (-74.087520418, 0.8, 321.088295015),
    ]]
    fillet(fillet1_edges, radius=FILLET1_R)

    # Fillet2
    fillet2_edges = [part.edges().sort_by_distance(p)[0] for p in [
        (-149.693154221, 0.8, 327.285477572),
        (-149.693154221, 0.8, 126.496745191),
        (-45.580478165, 0.8, 126.496745191),
        (-45.580478165, 0.8, 327.285477572),
    ]]
    fillet(fillet2_edges, radius=FILLET2_R)

    # Fillet3
    fillet3_edges = [part.edges().sort_by_distance(p)[0] for p in [
        (-149.693154221, 0.8, 312.412238135),
        (-149.693154221, 0.8, 141.369984628),
        (-45.580478165, 0.8, 141.369984628),
        (-45.580478165, 0.8, 312.412238135),
    ]]
    fillet(fillet3_edges, radius=FILLET3_R)

    # Fillet4
    fillet4_edges = [part.edges().sort_by_distance(p)[0] for p in [
        (-172.027588636, 0.8, 290.934342561),
    ]]
    fillet(fillet4_edges, radius=FILLET4_R)

    # Fillet5
    fillet5_edges = [part.edges().sort_by_distance(p)[0] for p in [
        (-168.591125345, 0.8, 287.360833055),
    ]]
    fillet(fillet5_edges, radius=FILLET5_R)

    # Fillet6
    fillet6_edges = [part.edges().sort_by_distance(p)[0] for p in [
        (-26.682507041, 0.8, 287.360833055),
    ]]
    fillet(fillet6_edges, radius=FILLET6_R)

    # Fillet7
    fillet7_edges = [part.edges().sort_by_distance(p)[0] for p in [
        (-23.246043749, 0.8, 290.934342561),
    ]]
    fillet(fillet7_edges, radius=FILLET7_R)

    # Fillet8
    fillet8_edges = [part.edges().sort_by_distance(p)[0] for p in [
        (-172.027588636, 0.8, 162.847880202),
        (-23.246043749, 0.8, 162.847880202),
    ]]
    fillet(fillet8_edges, radius=FILLET8_R)

    # Fillet9
    fillet9_edges = [part.edges().sort_by_distance(p)[0] for p in [
        (-168.591125345, 0.8, 166.421389708),
        (-26.682507041, 0.8, 166.421389708),
    ]]
    fillet(fillet9_edges, radius=FILLET9_R)

    # Fillet10
    fillet10_edges = [part.edges().sort_by_distance(p)[0] for p in [
        (-182.538224567, 0.8, 253.538985229),
        (-182.538224567, 0.8, 200.243237534),
        (-12.735407819, 0.8, 200.243237534),
        (-12.735407819, 0.8, 253.538985229),
    ]]
    fillet(fillet10_edges, radius=FILLET10_R)

    # Fillet11
    fillet11_edges = [part.edges().sort_by_distance(p)[0] for p in [
        (-186.256534503, 0.8, 200.243237534),
        (-186.256534503, 0.8, 253.538985229),
        (-9.017097883, 0.8, 253.538985229),
        (-9.017097883, 0.8, 200.243237534),
    ]]
    fillet(fillet11_edges, radius=FILLET11_R)


solid = part.part
